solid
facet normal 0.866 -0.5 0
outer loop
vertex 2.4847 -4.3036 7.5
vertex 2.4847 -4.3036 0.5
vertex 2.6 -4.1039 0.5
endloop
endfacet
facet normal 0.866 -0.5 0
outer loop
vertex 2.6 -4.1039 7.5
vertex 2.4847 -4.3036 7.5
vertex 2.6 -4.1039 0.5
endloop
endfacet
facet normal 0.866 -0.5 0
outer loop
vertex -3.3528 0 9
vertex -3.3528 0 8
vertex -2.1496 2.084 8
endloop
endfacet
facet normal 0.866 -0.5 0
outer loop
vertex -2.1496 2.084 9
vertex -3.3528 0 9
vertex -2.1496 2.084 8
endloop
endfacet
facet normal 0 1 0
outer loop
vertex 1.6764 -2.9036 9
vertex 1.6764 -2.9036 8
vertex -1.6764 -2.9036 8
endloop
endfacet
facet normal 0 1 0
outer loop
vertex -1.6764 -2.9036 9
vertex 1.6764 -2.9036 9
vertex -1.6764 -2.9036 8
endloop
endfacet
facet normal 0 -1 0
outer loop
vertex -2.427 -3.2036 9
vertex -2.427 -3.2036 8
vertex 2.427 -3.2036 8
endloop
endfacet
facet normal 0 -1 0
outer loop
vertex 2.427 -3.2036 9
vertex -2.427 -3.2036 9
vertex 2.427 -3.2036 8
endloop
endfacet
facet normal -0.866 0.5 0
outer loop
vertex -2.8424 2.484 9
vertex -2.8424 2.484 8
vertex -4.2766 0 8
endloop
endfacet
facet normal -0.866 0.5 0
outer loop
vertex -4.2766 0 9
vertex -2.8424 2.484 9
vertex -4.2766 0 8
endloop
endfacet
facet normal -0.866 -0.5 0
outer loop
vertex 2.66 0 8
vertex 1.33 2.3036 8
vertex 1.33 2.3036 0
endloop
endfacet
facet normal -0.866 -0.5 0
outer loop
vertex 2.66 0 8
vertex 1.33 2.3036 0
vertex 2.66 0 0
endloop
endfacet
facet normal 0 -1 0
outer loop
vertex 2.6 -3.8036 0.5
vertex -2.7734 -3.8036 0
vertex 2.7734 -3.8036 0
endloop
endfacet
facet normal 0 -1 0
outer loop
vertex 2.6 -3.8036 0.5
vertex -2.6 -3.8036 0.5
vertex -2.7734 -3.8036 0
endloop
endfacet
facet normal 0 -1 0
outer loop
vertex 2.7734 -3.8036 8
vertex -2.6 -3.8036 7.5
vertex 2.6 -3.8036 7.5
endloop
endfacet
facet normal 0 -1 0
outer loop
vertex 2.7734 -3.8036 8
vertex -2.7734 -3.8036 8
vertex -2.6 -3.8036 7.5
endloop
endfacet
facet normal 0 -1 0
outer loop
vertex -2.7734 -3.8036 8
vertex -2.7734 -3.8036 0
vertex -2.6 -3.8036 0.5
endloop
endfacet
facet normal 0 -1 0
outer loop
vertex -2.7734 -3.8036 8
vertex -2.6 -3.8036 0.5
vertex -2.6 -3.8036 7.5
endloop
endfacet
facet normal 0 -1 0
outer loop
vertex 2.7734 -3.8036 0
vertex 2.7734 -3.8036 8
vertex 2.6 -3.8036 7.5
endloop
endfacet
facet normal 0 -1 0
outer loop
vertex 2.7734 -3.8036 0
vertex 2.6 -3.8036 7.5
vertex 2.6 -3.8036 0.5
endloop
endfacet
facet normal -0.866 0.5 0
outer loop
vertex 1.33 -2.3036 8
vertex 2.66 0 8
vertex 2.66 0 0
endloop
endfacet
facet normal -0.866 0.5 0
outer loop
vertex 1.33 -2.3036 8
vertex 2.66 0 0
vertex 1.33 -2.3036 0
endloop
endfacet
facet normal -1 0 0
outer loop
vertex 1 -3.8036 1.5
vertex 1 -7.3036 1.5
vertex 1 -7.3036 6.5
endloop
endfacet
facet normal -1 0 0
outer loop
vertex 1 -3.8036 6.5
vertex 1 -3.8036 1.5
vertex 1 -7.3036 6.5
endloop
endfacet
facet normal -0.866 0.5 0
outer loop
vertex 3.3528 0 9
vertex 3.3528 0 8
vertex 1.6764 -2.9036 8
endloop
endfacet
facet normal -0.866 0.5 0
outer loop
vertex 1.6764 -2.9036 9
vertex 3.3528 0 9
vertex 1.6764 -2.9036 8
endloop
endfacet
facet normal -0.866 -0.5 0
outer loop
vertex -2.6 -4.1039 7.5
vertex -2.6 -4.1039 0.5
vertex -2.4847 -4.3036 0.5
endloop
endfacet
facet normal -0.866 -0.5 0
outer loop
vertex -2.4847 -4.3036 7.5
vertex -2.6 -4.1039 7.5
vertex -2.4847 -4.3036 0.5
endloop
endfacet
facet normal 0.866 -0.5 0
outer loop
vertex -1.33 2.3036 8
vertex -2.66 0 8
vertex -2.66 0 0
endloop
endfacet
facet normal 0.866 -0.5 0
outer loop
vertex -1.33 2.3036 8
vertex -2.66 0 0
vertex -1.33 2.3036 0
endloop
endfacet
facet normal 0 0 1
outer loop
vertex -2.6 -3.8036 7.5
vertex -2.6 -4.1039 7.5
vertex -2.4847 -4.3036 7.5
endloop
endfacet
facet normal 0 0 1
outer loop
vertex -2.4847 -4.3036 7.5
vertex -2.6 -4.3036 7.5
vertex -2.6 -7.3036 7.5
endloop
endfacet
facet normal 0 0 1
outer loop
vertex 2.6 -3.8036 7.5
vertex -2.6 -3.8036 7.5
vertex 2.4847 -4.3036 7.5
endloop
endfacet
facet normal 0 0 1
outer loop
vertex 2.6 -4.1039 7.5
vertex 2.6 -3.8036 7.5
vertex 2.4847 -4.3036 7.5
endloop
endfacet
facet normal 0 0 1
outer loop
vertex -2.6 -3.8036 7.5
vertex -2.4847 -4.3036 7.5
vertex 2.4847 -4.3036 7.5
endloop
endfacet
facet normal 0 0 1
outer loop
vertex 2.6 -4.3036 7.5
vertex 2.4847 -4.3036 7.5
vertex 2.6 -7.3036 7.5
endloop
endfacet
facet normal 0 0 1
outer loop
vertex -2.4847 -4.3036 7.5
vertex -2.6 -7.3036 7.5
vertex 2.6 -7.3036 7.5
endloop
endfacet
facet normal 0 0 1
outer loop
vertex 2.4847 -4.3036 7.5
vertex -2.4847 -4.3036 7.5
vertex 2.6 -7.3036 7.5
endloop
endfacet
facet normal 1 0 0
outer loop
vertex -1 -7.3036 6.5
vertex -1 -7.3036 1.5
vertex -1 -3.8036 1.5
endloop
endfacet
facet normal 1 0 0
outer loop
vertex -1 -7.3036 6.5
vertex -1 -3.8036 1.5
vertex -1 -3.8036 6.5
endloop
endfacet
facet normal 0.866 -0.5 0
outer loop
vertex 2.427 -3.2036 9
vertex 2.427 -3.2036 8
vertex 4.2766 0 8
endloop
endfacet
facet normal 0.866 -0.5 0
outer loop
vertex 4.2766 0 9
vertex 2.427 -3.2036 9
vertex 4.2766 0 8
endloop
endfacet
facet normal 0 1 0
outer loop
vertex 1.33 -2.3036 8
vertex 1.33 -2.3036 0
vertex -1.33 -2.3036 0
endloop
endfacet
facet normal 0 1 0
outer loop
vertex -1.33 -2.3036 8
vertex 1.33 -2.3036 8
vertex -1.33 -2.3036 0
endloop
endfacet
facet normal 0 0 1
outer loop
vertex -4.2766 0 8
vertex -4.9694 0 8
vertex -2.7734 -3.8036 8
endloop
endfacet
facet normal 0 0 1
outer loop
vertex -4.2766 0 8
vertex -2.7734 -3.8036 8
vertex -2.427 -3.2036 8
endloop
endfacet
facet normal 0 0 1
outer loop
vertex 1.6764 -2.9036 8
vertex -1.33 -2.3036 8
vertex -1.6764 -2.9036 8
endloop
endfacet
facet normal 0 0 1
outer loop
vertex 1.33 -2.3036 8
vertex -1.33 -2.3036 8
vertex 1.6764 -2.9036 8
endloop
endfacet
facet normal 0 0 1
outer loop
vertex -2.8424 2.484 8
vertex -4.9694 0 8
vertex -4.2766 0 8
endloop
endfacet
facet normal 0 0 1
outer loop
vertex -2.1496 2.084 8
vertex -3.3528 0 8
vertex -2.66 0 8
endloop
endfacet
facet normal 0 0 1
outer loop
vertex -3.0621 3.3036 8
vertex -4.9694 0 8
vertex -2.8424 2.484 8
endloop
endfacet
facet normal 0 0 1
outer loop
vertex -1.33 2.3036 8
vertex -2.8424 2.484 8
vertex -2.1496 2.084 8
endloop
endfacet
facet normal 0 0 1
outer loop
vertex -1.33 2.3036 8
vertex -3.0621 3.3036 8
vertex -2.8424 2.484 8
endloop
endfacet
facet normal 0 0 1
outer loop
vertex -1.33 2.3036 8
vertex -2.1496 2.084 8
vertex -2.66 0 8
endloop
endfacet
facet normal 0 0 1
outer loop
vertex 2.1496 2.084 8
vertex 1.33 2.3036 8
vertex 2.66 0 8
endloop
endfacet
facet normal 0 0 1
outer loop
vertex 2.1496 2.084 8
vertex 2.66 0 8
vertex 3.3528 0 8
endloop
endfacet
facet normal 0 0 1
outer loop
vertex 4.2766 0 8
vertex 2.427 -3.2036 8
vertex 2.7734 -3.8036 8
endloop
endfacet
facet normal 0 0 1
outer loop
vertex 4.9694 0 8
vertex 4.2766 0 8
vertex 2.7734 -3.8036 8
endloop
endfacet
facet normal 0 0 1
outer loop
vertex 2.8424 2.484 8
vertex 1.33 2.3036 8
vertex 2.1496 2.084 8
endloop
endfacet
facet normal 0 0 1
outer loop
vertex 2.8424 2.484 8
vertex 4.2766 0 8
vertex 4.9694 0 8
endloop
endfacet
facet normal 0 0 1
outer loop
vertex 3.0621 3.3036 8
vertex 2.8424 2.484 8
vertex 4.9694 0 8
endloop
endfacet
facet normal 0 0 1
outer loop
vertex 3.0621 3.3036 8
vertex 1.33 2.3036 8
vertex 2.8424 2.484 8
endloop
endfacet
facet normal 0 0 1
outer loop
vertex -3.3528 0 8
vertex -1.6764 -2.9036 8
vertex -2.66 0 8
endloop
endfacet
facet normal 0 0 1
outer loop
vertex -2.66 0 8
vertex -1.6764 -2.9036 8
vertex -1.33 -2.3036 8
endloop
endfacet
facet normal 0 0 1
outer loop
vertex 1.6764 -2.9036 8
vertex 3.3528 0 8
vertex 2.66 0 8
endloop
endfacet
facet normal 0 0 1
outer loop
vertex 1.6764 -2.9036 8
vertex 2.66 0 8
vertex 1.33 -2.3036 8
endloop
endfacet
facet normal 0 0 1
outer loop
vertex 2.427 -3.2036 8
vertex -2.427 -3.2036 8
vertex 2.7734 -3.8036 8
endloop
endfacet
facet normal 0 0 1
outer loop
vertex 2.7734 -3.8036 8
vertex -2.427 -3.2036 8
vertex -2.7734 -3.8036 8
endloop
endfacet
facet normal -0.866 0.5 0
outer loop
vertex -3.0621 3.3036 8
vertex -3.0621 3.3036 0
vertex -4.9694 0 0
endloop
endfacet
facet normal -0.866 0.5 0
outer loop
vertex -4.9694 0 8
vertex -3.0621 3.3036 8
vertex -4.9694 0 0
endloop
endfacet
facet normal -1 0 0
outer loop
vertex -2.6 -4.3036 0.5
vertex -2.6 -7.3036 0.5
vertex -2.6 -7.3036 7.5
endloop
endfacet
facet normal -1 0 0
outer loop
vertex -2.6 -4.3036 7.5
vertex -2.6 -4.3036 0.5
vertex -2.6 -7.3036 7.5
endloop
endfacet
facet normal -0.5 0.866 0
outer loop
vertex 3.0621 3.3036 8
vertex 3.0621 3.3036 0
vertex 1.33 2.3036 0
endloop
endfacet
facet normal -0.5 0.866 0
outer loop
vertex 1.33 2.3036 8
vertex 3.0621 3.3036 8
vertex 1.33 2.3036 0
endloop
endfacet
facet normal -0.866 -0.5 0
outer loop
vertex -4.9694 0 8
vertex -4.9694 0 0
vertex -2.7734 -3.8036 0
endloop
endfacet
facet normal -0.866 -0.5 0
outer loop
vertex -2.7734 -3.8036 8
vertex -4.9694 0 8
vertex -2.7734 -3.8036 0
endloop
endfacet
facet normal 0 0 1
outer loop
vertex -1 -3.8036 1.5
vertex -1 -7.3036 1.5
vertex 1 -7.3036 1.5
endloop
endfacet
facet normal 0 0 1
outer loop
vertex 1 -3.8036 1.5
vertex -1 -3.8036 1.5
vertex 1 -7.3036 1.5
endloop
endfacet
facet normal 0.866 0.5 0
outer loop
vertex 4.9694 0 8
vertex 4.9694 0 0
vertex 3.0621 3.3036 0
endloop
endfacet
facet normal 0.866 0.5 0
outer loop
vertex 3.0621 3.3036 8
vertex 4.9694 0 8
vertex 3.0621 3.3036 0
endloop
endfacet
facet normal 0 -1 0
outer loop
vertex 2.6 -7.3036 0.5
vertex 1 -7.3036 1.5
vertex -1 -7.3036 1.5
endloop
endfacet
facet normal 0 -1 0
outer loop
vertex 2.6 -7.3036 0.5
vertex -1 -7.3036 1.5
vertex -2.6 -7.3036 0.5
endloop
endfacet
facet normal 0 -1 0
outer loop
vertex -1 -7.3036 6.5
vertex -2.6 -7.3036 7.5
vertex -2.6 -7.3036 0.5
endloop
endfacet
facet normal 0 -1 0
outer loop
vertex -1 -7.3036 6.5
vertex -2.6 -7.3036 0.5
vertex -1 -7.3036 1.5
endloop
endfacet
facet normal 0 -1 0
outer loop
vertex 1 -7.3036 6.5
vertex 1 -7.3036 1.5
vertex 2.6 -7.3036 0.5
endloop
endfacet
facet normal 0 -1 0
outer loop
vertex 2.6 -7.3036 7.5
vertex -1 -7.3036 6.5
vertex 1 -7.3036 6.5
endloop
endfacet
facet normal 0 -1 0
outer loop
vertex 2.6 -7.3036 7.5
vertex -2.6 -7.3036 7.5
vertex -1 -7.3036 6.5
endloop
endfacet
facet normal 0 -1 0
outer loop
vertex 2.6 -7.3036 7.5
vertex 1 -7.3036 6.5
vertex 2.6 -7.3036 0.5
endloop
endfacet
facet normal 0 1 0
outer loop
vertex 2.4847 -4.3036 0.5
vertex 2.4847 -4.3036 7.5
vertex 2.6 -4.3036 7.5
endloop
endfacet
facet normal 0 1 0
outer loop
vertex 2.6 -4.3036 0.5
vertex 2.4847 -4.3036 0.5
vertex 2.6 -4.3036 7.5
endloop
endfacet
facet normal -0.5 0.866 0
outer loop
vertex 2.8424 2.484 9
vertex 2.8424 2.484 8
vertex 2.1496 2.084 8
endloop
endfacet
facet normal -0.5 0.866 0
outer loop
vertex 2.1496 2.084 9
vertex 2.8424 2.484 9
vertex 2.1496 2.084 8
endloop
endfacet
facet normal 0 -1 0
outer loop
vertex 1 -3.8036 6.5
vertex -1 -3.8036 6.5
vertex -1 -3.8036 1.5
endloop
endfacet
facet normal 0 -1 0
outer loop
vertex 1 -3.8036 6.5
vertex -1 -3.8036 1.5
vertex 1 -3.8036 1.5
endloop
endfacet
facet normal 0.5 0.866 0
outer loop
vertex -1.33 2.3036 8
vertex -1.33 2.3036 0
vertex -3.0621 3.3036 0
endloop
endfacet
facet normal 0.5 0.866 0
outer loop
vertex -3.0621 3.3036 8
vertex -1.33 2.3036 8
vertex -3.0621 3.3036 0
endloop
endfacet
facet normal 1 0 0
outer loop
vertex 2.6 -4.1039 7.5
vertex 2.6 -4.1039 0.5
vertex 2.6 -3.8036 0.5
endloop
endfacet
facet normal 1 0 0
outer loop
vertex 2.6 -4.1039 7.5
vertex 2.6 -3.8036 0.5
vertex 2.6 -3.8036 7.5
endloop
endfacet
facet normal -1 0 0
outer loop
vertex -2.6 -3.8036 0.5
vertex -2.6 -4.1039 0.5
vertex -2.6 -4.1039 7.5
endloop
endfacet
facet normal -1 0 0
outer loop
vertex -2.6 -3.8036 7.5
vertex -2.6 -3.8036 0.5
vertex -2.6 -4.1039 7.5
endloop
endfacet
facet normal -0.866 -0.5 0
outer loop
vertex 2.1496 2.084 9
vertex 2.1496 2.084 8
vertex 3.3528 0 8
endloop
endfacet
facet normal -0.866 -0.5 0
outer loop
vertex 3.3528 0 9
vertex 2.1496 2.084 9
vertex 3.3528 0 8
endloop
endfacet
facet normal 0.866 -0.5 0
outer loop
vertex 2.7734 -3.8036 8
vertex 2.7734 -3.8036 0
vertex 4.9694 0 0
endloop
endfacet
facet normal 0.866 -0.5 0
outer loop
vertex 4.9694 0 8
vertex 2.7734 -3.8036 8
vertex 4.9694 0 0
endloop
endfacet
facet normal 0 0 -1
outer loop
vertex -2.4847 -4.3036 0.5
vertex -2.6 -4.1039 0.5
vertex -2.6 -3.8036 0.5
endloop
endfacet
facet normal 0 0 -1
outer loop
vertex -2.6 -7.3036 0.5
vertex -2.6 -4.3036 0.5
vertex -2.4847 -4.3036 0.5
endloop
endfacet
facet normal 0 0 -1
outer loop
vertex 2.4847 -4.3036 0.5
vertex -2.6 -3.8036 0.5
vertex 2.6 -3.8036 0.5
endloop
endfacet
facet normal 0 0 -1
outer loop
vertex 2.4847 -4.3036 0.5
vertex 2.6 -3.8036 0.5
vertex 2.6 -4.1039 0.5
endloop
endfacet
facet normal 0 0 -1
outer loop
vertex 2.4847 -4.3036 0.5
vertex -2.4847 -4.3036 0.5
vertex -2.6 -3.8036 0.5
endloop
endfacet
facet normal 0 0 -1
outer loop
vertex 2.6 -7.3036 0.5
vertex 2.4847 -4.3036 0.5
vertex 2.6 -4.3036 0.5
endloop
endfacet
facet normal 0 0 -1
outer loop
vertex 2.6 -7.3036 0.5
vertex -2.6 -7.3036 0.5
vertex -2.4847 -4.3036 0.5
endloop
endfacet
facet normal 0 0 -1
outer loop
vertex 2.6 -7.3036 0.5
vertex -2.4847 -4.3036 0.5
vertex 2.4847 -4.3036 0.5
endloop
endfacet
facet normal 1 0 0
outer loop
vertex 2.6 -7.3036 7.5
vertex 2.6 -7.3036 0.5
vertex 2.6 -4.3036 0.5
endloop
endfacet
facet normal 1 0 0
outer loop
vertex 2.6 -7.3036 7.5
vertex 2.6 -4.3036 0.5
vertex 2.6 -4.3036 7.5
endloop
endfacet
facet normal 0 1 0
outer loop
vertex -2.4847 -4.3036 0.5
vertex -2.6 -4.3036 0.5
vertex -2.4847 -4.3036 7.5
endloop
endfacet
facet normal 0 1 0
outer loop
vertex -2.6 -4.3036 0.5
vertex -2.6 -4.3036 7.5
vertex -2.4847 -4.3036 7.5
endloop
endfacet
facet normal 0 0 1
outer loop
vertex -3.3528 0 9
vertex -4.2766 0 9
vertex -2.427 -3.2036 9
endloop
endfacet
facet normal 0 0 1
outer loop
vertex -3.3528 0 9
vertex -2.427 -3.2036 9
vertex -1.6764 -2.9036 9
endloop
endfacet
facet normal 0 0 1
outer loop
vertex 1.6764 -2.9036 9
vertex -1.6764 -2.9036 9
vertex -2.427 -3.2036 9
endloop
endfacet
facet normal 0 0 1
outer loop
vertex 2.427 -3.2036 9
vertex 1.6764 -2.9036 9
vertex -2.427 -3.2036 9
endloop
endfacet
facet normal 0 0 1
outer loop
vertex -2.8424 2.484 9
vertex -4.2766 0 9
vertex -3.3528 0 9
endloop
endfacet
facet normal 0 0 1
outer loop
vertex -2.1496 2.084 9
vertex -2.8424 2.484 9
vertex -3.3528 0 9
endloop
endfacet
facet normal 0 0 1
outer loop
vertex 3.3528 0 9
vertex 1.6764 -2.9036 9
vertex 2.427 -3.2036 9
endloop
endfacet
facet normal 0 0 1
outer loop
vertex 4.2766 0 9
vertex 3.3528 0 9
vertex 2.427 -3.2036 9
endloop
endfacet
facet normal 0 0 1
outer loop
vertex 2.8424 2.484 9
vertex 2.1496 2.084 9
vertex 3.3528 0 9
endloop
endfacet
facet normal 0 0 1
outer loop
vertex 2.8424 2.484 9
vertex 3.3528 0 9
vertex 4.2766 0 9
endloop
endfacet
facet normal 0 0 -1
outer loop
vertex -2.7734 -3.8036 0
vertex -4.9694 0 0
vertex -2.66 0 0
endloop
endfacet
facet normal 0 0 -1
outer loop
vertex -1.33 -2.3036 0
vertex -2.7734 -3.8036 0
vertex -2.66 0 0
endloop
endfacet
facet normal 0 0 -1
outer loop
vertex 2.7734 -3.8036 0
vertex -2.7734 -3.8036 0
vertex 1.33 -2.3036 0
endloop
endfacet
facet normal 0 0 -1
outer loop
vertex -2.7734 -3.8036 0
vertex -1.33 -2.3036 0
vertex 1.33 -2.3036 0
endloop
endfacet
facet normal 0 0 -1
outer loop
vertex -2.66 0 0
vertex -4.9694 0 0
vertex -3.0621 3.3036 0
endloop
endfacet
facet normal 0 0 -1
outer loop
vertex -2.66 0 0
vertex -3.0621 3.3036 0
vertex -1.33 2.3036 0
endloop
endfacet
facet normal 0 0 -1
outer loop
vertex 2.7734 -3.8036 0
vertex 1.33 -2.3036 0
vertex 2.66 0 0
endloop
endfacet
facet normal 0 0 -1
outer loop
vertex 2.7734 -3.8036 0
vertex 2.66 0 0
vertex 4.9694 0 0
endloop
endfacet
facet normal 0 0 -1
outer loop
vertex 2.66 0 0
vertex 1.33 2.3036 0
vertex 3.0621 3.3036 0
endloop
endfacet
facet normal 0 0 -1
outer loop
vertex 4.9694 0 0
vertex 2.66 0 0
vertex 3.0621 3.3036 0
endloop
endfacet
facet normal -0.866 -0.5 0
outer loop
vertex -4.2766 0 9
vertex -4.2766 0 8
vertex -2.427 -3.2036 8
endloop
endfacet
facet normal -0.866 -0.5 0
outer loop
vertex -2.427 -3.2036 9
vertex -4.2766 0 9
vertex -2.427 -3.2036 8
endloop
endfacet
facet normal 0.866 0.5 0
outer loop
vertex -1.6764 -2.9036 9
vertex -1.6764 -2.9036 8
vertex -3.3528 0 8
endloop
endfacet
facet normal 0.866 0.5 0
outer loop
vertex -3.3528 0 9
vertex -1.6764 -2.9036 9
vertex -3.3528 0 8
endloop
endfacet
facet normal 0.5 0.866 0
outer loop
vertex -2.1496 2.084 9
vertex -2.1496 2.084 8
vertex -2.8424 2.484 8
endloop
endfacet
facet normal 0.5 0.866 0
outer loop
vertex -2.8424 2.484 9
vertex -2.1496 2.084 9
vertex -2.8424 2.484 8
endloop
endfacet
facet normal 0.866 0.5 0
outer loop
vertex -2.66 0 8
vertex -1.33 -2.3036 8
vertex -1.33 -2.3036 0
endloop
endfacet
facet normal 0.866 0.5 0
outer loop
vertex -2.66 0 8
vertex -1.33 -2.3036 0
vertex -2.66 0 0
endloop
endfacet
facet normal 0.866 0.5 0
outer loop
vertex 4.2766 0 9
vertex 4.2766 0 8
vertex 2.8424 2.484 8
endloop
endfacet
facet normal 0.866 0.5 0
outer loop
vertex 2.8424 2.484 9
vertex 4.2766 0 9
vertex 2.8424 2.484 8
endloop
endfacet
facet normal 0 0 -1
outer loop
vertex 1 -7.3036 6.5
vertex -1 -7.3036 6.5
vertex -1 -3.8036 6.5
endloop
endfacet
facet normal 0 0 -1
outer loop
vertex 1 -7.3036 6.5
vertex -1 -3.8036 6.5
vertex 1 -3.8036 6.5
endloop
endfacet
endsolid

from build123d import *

# Parameters (mm, degrees)
EXTRUDE_1_DEPTH      = 8
SKETCH_2_W           = 9
SKETCH_2_H           = 8
EXTRUDE_2_DEPTH      = 3
SKETCH_3_OUTSIDE_W   = 15.256
SKETCH_3_OUTSIDE_H   = 13.318
SKETCH_3_OUTSIDE_W_2 = 5.2
SKETCH_3_OUTSIDE_H_2 = 7
SKETCH_3_OUTSIDE_W_3 = 2
SKETCH_3_OUTSIDE_H_3 = 5
CUT_EXTRUDE_1_DEPTH  = 3.5
EXTRUDE_3_DEPTH      = 1


with BuildPart() as part:
    # 草图1 → 凸台-拉伸1 (new body)
    with BuildSketch(Plane.XY):
        Polygon((-3.062050808, 3.303627574), (-4.969401077, 0), (-2.484700538, -4.303627574), (2.484700538, -4.303627574), (4.969401077, 0), (3.062050808, 3.303627574), (1.33, 2.303627574), (2.66, 0), (1.33, -2.303627574), (-1.33, -2.303627574), (-2.66, 0), (-1.33, 2.303627574), align=None)
    extrude(amount=EXTRUDE_1_DEPTH)

    # 草图2 → 凸台-拉伸2 (add)
    with BuildSketch(Plane.XZ.offset(4.303627574)):
        with Locations((0, 4)):
            Rectangle(SKETCH_2_W, SKETCH_2_H)
    extrude(amount=EXTRUDE_2_DEPTH)

    # 草图3 outside → 切除-拉伸1 (cut)
    # profile 1 of 2: a face of its own
    with BuildSketch(Plane.XZ.offset(7.303627574)):
        with Locations((0, 4)):
            Rectangle(SKETCH_3_OUTSIDE_W, SKETCH_3_OUTSIDE_H)
        with Locations((0, 4)):
            Rectangle(SKETCH_3_OUTSIDE_W_2, SKETCH_3_OUTSIDE_H_2, mode=Mode.SUBTRACT)
    # profile 2 of 2: a face of its own
    with BuildSketch(Plane.XZ.offset(7.303627574)):
        with Locations((0, 4)):
            Rectangle(SKETCH_3_OUTSIDE_W_3, SKETCH_3_OUTSIDE_H_3)
    extrude(amount=-CUT_EXTRUDE_1_DEPTH, mode=Mode.SUBTRACT)

    # 草图4 → 凸台-拉伸3 (add)
    with BuildSketch(Plane.XY.offset(8)):
        Polygon((-4.276580754, 0), (-2.426965511, -3.203627574), (2.426965511, -3.203627574), (4.276580754, 0), (2.842435565, 2.484012332), (2.149615242, 2.084012332), (3.352820323, 0), (1.676410162, -2.903627574), (-1.676410162, -2.903627574), (-3.352820323, 0), (-2.149615242, 2.084012332), (-2.842435565, 2.484012332), align=None)
    extrude(amount=EXTRUDE_3_DEPTH)


solid = part.part
